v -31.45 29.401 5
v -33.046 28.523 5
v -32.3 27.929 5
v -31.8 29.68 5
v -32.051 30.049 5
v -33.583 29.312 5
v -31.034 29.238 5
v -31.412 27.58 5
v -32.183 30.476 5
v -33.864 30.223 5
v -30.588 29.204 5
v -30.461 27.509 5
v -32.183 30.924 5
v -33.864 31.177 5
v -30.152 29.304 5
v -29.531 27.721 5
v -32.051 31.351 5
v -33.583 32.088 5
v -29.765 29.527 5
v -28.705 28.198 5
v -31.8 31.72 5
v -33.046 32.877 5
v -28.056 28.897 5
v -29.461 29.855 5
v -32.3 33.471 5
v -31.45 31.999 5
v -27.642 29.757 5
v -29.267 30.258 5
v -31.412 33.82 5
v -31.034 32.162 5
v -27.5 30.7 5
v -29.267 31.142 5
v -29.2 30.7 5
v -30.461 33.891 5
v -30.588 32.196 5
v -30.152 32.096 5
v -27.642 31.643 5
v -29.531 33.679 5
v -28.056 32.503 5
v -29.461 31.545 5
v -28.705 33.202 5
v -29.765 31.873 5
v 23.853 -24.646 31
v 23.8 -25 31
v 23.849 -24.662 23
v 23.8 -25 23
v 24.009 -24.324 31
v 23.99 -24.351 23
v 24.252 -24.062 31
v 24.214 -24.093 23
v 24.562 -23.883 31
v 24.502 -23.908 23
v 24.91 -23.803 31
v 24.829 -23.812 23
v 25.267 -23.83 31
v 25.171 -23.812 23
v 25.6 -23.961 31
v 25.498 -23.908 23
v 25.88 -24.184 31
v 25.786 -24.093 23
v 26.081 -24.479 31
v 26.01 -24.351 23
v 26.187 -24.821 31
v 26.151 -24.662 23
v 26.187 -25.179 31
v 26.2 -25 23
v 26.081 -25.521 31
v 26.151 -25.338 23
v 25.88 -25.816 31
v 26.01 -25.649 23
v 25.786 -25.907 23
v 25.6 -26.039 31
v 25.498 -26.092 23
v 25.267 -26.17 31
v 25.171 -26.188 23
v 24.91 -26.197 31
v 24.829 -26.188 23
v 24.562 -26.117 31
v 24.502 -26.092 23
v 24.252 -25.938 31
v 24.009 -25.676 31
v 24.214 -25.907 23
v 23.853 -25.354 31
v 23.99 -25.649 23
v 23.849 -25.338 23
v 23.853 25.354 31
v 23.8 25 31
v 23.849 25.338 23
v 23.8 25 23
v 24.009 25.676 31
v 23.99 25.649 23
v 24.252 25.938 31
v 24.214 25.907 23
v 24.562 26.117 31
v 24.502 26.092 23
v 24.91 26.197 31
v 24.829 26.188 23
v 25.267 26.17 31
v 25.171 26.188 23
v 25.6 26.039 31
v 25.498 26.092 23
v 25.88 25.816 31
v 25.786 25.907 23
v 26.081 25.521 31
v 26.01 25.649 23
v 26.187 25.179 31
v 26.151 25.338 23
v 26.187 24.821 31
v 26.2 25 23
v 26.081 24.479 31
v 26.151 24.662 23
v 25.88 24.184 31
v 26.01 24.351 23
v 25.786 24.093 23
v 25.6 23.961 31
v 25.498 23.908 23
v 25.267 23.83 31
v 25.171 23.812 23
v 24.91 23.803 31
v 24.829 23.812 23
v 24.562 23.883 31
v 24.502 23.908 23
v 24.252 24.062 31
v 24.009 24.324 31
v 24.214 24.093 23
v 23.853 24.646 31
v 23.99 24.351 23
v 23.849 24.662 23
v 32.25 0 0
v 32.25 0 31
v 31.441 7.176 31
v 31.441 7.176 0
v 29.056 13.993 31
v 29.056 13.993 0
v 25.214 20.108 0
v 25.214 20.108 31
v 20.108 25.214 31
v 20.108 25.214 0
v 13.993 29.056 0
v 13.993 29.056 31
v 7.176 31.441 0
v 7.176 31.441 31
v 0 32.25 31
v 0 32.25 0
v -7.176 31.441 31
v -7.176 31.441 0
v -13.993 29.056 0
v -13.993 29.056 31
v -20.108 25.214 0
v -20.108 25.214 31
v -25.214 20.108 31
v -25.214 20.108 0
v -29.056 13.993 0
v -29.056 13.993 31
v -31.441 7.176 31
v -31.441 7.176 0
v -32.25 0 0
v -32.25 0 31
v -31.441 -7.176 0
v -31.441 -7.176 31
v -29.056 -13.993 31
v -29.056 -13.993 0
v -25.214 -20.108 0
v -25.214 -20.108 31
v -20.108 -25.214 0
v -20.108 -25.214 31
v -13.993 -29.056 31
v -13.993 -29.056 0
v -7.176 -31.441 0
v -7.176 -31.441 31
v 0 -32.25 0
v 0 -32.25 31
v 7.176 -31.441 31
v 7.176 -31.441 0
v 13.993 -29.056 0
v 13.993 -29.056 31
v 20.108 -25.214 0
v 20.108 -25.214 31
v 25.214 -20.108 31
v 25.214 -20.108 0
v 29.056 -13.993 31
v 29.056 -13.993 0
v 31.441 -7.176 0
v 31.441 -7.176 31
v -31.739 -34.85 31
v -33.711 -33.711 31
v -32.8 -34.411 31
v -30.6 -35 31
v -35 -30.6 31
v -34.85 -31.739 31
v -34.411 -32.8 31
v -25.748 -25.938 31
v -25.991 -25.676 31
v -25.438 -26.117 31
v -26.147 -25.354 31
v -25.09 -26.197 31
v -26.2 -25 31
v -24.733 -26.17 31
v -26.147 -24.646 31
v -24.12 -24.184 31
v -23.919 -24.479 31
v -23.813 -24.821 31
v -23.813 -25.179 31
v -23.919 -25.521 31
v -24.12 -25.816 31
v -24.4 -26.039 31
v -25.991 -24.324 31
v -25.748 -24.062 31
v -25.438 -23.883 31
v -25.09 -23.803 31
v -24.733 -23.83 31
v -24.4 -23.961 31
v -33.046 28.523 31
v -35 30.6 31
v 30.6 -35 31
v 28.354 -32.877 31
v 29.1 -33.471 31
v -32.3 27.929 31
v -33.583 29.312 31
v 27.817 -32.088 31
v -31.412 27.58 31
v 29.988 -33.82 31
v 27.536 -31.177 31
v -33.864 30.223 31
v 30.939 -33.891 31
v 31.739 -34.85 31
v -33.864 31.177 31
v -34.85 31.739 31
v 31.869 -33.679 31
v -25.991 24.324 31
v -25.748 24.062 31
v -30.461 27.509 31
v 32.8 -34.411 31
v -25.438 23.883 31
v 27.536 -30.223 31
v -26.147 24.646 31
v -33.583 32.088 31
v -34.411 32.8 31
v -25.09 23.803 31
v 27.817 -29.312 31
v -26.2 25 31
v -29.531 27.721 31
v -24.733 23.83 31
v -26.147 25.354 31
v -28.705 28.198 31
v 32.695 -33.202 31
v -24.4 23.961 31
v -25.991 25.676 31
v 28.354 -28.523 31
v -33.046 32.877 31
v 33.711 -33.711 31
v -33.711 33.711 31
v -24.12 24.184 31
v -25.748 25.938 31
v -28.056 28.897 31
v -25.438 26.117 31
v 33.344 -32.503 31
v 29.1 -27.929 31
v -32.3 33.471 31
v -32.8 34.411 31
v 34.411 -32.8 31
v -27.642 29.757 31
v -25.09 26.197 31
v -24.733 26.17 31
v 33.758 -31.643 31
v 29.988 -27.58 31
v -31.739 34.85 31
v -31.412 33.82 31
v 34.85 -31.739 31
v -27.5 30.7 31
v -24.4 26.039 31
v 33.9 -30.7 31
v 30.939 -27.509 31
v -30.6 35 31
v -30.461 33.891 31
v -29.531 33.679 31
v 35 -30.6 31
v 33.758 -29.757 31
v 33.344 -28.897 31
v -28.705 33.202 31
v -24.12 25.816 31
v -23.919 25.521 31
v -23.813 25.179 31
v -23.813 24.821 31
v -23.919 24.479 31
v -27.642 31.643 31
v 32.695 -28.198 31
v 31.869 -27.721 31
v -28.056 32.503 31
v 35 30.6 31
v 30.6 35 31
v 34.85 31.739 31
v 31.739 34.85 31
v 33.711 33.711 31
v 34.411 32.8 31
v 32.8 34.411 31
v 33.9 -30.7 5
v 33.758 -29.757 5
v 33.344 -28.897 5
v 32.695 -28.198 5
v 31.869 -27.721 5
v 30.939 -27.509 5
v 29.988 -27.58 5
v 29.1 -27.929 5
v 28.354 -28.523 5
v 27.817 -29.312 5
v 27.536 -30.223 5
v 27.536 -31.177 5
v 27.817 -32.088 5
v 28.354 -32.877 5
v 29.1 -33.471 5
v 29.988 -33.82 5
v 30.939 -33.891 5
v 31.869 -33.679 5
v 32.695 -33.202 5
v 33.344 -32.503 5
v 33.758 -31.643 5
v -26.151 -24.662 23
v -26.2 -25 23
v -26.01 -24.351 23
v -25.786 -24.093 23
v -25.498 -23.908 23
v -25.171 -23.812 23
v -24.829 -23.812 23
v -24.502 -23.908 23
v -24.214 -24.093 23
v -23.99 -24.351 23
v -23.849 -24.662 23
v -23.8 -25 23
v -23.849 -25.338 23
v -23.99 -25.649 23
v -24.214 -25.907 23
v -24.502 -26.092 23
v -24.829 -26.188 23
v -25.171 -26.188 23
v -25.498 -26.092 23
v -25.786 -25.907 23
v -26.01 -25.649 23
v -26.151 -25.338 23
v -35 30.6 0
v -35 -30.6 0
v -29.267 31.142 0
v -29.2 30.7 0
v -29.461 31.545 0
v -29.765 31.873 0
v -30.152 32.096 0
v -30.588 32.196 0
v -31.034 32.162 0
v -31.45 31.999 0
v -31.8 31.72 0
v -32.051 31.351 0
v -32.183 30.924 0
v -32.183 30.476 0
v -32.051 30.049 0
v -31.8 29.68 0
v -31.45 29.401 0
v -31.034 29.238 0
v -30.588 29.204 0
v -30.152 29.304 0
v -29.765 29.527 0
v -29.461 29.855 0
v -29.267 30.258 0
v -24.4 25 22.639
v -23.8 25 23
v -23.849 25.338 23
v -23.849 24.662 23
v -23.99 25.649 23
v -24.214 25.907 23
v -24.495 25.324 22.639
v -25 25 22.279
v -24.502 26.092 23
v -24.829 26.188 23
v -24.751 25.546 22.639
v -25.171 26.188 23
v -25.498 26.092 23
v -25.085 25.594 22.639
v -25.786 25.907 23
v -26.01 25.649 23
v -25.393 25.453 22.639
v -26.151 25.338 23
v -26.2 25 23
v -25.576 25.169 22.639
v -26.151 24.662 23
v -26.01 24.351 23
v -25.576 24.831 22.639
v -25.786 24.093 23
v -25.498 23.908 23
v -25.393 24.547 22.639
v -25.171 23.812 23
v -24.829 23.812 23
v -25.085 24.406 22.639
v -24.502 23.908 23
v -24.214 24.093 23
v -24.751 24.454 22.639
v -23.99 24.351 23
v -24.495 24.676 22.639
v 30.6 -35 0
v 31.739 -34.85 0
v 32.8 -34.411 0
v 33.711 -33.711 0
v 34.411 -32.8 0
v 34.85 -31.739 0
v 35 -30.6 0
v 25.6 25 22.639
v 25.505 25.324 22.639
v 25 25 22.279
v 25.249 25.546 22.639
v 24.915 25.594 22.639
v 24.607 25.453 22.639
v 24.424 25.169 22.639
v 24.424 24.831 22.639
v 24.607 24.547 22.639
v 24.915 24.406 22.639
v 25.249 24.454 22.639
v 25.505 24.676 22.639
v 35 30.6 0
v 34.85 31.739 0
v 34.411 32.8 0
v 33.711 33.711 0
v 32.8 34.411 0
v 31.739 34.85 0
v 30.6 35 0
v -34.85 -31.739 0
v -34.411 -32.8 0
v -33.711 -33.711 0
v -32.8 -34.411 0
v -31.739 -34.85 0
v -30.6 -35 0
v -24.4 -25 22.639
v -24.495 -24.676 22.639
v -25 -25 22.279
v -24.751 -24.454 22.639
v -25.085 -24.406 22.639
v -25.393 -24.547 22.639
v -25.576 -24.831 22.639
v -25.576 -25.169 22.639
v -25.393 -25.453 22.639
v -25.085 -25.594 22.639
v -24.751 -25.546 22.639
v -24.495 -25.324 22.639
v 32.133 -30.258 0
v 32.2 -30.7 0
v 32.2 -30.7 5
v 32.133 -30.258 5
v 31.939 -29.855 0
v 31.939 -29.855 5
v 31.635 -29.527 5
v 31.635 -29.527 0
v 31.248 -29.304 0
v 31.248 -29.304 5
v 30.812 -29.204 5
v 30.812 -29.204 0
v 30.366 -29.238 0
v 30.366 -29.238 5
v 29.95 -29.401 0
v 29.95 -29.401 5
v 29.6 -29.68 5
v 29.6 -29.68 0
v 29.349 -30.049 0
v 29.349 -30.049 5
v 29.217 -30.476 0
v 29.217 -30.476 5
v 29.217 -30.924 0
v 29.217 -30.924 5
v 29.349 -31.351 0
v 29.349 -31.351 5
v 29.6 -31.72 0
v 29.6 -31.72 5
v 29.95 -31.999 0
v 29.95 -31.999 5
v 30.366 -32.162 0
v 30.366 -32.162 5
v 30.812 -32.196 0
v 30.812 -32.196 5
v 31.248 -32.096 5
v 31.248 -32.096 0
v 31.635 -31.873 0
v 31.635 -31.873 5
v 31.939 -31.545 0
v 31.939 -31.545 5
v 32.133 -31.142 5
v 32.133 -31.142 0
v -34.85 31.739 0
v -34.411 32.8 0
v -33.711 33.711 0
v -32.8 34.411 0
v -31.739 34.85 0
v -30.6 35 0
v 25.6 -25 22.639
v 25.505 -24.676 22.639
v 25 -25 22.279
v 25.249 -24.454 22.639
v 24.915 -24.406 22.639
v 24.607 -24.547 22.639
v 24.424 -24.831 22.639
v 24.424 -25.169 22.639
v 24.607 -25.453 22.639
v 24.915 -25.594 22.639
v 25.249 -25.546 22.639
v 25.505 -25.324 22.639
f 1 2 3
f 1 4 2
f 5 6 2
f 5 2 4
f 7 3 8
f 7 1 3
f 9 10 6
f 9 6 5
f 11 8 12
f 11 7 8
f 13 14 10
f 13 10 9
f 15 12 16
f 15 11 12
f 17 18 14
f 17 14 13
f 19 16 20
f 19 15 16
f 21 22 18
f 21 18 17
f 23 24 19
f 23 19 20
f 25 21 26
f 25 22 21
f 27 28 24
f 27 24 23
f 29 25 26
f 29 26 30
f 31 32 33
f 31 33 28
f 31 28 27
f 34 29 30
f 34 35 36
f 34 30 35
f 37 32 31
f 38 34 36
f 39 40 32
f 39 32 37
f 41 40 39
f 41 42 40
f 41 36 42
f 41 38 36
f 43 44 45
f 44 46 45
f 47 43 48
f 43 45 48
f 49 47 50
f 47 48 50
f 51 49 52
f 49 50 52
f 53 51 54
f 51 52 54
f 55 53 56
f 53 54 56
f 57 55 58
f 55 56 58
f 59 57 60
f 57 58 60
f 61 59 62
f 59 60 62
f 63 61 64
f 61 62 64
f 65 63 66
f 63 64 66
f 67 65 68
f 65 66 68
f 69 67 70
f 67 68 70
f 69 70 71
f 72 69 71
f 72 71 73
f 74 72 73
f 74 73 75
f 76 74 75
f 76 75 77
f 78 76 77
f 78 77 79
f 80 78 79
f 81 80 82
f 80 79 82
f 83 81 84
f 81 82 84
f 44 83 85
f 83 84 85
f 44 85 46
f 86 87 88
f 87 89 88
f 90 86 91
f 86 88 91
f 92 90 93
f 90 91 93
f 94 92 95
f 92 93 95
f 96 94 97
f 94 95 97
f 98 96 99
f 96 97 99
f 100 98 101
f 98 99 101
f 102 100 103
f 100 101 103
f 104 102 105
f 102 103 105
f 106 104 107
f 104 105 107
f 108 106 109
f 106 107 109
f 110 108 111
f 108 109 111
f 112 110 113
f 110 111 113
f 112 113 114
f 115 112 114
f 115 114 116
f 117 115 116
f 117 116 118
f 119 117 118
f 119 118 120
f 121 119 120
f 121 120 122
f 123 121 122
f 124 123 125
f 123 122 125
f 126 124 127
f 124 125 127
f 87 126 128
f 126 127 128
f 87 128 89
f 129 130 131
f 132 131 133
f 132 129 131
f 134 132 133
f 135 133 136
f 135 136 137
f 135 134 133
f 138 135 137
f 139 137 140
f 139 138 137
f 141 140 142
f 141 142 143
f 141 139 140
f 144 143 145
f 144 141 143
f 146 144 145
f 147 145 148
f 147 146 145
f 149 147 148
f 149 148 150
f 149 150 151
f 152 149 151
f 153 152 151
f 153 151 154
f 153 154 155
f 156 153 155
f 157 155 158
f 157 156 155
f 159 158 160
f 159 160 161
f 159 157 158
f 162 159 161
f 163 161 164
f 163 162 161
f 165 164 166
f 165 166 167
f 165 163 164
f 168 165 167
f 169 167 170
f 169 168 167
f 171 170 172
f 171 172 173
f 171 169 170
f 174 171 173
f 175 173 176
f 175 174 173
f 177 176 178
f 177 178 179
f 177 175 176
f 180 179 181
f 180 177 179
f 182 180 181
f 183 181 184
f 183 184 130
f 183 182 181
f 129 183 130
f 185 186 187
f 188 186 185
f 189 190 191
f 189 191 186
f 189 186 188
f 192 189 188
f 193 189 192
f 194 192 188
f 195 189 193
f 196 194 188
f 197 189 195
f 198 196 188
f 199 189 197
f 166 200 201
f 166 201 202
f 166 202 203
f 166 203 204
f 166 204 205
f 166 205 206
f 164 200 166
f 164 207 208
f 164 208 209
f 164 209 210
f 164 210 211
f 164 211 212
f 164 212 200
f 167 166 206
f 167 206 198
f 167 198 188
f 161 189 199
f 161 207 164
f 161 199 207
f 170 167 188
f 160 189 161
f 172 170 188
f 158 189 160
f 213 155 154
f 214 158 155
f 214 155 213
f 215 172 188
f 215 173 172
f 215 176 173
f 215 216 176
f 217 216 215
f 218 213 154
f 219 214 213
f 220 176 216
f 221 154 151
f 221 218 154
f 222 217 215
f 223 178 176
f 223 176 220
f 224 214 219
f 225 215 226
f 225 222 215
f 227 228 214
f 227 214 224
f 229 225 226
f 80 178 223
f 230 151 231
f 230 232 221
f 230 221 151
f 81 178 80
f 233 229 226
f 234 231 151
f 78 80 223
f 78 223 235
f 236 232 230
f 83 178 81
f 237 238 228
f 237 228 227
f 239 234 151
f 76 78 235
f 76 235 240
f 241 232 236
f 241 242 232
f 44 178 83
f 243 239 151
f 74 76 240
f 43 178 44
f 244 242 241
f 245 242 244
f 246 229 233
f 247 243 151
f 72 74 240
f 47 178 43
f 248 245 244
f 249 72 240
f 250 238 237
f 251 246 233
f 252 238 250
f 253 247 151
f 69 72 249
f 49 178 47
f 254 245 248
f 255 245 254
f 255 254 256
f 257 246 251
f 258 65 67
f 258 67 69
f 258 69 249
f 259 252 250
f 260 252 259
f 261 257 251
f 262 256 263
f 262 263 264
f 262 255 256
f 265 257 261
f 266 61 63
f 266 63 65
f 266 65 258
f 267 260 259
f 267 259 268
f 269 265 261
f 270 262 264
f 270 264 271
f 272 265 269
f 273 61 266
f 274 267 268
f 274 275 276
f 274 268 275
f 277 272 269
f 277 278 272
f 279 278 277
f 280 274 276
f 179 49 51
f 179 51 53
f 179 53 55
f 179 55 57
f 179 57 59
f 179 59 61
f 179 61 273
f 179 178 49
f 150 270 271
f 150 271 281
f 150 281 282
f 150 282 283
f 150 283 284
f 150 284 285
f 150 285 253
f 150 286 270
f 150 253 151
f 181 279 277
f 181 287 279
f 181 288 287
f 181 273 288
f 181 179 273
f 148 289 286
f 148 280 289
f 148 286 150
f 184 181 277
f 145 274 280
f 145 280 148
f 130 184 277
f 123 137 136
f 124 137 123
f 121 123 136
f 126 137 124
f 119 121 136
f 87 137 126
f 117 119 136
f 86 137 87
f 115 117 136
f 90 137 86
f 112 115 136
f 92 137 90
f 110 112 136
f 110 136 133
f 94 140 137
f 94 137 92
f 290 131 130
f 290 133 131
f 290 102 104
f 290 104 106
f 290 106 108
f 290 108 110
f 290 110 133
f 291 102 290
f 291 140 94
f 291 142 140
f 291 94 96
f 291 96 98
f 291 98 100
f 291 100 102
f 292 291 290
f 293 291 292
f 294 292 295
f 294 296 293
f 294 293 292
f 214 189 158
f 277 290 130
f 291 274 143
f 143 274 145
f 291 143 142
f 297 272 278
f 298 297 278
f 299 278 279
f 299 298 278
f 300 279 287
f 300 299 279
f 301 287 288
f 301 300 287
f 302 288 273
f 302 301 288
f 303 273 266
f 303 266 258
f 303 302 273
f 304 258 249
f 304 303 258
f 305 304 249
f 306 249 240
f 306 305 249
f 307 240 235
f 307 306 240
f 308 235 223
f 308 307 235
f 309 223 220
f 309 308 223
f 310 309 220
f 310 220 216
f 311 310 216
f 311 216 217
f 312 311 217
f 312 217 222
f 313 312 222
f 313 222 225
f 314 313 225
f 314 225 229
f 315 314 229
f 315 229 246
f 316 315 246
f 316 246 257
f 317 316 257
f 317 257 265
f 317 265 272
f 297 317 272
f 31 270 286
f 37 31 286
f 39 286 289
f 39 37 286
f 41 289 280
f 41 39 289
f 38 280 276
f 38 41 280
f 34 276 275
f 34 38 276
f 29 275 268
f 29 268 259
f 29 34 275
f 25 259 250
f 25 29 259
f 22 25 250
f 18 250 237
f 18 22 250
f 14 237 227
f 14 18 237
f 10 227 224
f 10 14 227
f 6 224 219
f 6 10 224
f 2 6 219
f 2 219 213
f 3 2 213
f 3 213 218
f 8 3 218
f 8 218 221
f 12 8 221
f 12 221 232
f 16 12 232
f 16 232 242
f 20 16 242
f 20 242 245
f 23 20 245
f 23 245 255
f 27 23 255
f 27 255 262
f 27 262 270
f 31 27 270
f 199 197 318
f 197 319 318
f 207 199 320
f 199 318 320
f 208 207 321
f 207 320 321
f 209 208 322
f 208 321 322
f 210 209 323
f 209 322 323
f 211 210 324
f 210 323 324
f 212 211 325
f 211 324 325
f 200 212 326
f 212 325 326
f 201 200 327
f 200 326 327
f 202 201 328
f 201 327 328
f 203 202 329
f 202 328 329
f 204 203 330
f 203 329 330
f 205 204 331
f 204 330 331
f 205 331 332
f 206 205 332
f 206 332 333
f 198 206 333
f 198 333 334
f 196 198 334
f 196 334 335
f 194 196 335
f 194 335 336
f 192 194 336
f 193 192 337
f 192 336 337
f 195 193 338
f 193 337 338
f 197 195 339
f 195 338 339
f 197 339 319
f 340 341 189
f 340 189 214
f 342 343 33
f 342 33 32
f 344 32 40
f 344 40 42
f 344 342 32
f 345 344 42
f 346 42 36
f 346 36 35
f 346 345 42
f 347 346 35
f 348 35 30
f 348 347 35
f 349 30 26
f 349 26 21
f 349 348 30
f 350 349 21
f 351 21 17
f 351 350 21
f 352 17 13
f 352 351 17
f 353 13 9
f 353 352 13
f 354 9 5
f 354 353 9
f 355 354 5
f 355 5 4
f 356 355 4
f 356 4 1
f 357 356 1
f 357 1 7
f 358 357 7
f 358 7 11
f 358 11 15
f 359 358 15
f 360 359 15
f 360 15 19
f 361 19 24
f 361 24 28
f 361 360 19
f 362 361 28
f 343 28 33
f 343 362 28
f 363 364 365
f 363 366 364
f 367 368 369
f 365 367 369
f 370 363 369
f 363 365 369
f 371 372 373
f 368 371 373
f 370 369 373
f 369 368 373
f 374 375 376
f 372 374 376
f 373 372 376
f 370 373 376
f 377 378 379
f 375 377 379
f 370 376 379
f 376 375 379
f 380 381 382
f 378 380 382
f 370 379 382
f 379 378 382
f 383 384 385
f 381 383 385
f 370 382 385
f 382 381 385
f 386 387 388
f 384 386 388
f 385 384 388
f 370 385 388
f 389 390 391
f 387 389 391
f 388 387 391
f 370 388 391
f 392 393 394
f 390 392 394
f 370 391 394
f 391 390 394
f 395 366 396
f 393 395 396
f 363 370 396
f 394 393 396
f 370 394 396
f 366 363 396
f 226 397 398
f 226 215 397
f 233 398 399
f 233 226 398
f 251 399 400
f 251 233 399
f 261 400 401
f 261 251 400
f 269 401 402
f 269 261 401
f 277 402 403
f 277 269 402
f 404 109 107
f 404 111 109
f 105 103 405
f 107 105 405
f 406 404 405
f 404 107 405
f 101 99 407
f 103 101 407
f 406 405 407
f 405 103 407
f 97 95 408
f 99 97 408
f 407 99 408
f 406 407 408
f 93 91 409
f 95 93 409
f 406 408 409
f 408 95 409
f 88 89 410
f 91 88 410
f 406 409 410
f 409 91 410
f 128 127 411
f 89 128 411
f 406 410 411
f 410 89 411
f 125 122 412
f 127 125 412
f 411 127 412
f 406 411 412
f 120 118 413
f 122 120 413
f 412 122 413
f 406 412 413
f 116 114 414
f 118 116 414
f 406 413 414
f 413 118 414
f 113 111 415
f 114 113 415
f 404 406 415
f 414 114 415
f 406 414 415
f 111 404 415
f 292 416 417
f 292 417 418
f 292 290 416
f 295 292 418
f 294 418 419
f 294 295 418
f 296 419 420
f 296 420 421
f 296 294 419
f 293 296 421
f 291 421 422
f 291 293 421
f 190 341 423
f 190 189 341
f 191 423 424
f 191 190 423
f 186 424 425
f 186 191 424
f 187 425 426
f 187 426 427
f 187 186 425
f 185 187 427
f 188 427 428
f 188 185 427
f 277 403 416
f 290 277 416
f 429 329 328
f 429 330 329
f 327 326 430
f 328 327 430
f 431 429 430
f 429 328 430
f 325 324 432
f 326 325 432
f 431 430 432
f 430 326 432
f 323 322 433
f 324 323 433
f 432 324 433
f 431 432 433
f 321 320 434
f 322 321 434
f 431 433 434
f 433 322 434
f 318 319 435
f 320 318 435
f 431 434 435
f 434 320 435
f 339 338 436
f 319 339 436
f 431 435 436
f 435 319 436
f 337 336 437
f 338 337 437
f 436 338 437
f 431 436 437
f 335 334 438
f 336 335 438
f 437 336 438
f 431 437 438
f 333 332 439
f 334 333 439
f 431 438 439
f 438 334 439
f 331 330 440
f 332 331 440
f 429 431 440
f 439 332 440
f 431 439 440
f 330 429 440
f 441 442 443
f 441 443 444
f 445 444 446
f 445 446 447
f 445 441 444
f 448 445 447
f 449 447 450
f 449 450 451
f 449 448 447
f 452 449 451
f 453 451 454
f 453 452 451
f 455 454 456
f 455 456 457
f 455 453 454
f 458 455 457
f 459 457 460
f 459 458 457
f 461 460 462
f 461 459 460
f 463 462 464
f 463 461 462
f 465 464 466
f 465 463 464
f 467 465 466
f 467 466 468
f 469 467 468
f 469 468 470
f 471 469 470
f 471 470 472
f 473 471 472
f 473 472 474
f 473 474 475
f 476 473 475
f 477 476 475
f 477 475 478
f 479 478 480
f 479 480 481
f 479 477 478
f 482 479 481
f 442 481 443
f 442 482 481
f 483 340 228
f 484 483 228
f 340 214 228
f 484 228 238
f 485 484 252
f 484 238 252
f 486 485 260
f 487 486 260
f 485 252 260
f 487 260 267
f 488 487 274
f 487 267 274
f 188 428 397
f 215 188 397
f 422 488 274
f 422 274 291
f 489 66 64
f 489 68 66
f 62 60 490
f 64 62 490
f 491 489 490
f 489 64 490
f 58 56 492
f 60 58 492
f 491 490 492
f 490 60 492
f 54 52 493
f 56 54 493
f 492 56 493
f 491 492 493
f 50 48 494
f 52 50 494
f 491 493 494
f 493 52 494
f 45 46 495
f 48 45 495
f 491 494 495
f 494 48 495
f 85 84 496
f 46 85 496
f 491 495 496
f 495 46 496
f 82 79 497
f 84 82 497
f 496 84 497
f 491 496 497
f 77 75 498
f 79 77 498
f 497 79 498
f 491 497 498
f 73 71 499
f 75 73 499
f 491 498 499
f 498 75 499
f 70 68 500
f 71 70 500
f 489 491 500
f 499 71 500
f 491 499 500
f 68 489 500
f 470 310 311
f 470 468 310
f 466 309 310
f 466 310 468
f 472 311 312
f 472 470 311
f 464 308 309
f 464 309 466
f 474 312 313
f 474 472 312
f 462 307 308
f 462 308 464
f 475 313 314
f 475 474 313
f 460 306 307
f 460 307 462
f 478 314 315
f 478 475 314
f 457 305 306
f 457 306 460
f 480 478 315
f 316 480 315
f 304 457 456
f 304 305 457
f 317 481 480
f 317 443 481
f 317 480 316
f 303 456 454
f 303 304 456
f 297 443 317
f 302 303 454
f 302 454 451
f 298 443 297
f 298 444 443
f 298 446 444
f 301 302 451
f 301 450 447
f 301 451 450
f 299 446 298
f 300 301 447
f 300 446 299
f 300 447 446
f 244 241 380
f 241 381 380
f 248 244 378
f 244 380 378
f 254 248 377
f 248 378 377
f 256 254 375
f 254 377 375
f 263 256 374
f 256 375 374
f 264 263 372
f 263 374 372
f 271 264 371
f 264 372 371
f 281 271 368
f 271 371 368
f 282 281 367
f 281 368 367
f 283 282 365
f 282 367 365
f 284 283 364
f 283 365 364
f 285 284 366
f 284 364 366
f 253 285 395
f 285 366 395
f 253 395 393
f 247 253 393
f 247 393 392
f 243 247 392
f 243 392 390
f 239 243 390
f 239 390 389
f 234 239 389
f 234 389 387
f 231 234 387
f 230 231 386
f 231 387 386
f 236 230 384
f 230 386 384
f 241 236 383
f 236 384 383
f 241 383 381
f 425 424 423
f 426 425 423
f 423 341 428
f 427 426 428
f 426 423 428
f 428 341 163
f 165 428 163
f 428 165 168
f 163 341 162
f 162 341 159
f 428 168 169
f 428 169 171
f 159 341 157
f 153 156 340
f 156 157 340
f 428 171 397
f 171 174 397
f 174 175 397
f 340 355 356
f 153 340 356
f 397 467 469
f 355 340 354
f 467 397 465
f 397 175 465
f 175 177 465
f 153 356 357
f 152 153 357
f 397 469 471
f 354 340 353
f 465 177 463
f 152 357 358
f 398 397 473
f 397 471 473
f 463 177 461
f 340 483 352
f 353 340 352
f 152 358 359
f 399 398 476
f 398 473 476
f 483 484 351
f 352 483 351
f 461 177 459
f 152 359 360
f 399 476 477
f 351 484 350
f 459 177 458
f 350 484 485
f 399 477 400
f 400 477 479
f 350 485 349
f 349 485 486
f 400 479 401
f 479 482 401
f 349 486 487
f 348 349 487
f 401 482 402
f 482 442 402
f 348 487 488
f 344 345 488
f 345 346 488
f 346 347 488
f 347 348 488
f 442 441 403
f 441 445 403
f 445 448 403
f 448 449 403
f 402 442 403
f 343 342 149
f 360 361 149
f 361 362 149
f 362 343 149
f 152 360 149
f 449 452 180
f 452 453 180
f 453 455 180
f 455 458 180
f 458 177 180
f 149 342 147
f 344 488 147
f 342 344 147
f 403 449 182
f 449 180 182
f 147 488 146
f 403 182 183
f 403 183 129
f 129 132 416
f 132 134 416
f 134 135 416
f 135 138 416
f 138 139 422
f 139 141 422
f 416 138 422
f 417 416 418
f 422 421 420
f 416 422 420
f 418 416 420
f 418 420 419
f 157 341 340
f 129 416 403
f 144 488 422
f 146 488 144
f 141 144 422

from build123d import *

# Parameters (mm, degrees)
F0_W     = 70
F0_H     = 70
F0_R     = 3.2
F0_R_2   = 32.25
F1_DEPTH = 31
F0_R_3   = 1.5
F2_DEPTH = 5
F3_DEPTH = 5
F5_D     = 2.4
F5_DEPTH = 8
F5_TIP   = 0.7210327428
F6_R     = 4.4


with BuildPart() as f1:
    # F0 (on Top) → F1 (new body)
    with BuildSketch(Plane.XY):
        Rectangle(F0_W, F0_H)
        with Locations((30.7, -30.7)):
            Circle(F0_R, mode=Mode.SUBTRACT)
        with Locations((-30.7, 30.7)):
            Circle(F0_R, mode=Mode.SUBTRACT)
        Circle(F0_R_2, mode=Mode.SUBTRACT)
    extrude(amount=F1_DEPTH)

    # F0 (on Top) → F2 (join)
    with BuildSketch(Plane.XY):
        with Locations((-30.7, 30.7)):
            Circle(F0_R)
        with Locations((-30.7, 30.7)):
            Circle(F0_R_3, mode=Mode.SUBTRACT)
    extrude(amount=F2_DEPTH)

    # F0 (on Top) → F3 (join)
    with BuildSketch(Plane.XY):
        with Locations((30.7, -30.7)):
            Circle(F0_R)
        with Locations((30.7, -30.7)):
            Circle(F0_R_3, mode=Mode.SUBTRACT)
    extrude(amount=F3_DEPTH)

    # F5
    with Locations(Plane.XY.offset(31)):
        with Locations((-25, -25), (25, 25), (-25, 25), (25, -25)):
            Hole(F5_D / 2, depth=F5_DEPTH)
            with Locations((0, 0, -(F5_DEPTH + F5_TIP / 2))):  # 118° drill point
                Cone(0, F5_D / 2, F5_TIP, mode=Mode.SUBTRACT)

    # F6
    f6_edges = [f1.edges().sort_by_distance(p)[0] for p in [
        (-35, -35, 15.5),
        (35, -35, 15.5),
        (35, 35, 15.5),
        (-35, 35, 15.5),
    ]]
    fillet(f6_edges, radius=F6_R)


solid = f1.part
